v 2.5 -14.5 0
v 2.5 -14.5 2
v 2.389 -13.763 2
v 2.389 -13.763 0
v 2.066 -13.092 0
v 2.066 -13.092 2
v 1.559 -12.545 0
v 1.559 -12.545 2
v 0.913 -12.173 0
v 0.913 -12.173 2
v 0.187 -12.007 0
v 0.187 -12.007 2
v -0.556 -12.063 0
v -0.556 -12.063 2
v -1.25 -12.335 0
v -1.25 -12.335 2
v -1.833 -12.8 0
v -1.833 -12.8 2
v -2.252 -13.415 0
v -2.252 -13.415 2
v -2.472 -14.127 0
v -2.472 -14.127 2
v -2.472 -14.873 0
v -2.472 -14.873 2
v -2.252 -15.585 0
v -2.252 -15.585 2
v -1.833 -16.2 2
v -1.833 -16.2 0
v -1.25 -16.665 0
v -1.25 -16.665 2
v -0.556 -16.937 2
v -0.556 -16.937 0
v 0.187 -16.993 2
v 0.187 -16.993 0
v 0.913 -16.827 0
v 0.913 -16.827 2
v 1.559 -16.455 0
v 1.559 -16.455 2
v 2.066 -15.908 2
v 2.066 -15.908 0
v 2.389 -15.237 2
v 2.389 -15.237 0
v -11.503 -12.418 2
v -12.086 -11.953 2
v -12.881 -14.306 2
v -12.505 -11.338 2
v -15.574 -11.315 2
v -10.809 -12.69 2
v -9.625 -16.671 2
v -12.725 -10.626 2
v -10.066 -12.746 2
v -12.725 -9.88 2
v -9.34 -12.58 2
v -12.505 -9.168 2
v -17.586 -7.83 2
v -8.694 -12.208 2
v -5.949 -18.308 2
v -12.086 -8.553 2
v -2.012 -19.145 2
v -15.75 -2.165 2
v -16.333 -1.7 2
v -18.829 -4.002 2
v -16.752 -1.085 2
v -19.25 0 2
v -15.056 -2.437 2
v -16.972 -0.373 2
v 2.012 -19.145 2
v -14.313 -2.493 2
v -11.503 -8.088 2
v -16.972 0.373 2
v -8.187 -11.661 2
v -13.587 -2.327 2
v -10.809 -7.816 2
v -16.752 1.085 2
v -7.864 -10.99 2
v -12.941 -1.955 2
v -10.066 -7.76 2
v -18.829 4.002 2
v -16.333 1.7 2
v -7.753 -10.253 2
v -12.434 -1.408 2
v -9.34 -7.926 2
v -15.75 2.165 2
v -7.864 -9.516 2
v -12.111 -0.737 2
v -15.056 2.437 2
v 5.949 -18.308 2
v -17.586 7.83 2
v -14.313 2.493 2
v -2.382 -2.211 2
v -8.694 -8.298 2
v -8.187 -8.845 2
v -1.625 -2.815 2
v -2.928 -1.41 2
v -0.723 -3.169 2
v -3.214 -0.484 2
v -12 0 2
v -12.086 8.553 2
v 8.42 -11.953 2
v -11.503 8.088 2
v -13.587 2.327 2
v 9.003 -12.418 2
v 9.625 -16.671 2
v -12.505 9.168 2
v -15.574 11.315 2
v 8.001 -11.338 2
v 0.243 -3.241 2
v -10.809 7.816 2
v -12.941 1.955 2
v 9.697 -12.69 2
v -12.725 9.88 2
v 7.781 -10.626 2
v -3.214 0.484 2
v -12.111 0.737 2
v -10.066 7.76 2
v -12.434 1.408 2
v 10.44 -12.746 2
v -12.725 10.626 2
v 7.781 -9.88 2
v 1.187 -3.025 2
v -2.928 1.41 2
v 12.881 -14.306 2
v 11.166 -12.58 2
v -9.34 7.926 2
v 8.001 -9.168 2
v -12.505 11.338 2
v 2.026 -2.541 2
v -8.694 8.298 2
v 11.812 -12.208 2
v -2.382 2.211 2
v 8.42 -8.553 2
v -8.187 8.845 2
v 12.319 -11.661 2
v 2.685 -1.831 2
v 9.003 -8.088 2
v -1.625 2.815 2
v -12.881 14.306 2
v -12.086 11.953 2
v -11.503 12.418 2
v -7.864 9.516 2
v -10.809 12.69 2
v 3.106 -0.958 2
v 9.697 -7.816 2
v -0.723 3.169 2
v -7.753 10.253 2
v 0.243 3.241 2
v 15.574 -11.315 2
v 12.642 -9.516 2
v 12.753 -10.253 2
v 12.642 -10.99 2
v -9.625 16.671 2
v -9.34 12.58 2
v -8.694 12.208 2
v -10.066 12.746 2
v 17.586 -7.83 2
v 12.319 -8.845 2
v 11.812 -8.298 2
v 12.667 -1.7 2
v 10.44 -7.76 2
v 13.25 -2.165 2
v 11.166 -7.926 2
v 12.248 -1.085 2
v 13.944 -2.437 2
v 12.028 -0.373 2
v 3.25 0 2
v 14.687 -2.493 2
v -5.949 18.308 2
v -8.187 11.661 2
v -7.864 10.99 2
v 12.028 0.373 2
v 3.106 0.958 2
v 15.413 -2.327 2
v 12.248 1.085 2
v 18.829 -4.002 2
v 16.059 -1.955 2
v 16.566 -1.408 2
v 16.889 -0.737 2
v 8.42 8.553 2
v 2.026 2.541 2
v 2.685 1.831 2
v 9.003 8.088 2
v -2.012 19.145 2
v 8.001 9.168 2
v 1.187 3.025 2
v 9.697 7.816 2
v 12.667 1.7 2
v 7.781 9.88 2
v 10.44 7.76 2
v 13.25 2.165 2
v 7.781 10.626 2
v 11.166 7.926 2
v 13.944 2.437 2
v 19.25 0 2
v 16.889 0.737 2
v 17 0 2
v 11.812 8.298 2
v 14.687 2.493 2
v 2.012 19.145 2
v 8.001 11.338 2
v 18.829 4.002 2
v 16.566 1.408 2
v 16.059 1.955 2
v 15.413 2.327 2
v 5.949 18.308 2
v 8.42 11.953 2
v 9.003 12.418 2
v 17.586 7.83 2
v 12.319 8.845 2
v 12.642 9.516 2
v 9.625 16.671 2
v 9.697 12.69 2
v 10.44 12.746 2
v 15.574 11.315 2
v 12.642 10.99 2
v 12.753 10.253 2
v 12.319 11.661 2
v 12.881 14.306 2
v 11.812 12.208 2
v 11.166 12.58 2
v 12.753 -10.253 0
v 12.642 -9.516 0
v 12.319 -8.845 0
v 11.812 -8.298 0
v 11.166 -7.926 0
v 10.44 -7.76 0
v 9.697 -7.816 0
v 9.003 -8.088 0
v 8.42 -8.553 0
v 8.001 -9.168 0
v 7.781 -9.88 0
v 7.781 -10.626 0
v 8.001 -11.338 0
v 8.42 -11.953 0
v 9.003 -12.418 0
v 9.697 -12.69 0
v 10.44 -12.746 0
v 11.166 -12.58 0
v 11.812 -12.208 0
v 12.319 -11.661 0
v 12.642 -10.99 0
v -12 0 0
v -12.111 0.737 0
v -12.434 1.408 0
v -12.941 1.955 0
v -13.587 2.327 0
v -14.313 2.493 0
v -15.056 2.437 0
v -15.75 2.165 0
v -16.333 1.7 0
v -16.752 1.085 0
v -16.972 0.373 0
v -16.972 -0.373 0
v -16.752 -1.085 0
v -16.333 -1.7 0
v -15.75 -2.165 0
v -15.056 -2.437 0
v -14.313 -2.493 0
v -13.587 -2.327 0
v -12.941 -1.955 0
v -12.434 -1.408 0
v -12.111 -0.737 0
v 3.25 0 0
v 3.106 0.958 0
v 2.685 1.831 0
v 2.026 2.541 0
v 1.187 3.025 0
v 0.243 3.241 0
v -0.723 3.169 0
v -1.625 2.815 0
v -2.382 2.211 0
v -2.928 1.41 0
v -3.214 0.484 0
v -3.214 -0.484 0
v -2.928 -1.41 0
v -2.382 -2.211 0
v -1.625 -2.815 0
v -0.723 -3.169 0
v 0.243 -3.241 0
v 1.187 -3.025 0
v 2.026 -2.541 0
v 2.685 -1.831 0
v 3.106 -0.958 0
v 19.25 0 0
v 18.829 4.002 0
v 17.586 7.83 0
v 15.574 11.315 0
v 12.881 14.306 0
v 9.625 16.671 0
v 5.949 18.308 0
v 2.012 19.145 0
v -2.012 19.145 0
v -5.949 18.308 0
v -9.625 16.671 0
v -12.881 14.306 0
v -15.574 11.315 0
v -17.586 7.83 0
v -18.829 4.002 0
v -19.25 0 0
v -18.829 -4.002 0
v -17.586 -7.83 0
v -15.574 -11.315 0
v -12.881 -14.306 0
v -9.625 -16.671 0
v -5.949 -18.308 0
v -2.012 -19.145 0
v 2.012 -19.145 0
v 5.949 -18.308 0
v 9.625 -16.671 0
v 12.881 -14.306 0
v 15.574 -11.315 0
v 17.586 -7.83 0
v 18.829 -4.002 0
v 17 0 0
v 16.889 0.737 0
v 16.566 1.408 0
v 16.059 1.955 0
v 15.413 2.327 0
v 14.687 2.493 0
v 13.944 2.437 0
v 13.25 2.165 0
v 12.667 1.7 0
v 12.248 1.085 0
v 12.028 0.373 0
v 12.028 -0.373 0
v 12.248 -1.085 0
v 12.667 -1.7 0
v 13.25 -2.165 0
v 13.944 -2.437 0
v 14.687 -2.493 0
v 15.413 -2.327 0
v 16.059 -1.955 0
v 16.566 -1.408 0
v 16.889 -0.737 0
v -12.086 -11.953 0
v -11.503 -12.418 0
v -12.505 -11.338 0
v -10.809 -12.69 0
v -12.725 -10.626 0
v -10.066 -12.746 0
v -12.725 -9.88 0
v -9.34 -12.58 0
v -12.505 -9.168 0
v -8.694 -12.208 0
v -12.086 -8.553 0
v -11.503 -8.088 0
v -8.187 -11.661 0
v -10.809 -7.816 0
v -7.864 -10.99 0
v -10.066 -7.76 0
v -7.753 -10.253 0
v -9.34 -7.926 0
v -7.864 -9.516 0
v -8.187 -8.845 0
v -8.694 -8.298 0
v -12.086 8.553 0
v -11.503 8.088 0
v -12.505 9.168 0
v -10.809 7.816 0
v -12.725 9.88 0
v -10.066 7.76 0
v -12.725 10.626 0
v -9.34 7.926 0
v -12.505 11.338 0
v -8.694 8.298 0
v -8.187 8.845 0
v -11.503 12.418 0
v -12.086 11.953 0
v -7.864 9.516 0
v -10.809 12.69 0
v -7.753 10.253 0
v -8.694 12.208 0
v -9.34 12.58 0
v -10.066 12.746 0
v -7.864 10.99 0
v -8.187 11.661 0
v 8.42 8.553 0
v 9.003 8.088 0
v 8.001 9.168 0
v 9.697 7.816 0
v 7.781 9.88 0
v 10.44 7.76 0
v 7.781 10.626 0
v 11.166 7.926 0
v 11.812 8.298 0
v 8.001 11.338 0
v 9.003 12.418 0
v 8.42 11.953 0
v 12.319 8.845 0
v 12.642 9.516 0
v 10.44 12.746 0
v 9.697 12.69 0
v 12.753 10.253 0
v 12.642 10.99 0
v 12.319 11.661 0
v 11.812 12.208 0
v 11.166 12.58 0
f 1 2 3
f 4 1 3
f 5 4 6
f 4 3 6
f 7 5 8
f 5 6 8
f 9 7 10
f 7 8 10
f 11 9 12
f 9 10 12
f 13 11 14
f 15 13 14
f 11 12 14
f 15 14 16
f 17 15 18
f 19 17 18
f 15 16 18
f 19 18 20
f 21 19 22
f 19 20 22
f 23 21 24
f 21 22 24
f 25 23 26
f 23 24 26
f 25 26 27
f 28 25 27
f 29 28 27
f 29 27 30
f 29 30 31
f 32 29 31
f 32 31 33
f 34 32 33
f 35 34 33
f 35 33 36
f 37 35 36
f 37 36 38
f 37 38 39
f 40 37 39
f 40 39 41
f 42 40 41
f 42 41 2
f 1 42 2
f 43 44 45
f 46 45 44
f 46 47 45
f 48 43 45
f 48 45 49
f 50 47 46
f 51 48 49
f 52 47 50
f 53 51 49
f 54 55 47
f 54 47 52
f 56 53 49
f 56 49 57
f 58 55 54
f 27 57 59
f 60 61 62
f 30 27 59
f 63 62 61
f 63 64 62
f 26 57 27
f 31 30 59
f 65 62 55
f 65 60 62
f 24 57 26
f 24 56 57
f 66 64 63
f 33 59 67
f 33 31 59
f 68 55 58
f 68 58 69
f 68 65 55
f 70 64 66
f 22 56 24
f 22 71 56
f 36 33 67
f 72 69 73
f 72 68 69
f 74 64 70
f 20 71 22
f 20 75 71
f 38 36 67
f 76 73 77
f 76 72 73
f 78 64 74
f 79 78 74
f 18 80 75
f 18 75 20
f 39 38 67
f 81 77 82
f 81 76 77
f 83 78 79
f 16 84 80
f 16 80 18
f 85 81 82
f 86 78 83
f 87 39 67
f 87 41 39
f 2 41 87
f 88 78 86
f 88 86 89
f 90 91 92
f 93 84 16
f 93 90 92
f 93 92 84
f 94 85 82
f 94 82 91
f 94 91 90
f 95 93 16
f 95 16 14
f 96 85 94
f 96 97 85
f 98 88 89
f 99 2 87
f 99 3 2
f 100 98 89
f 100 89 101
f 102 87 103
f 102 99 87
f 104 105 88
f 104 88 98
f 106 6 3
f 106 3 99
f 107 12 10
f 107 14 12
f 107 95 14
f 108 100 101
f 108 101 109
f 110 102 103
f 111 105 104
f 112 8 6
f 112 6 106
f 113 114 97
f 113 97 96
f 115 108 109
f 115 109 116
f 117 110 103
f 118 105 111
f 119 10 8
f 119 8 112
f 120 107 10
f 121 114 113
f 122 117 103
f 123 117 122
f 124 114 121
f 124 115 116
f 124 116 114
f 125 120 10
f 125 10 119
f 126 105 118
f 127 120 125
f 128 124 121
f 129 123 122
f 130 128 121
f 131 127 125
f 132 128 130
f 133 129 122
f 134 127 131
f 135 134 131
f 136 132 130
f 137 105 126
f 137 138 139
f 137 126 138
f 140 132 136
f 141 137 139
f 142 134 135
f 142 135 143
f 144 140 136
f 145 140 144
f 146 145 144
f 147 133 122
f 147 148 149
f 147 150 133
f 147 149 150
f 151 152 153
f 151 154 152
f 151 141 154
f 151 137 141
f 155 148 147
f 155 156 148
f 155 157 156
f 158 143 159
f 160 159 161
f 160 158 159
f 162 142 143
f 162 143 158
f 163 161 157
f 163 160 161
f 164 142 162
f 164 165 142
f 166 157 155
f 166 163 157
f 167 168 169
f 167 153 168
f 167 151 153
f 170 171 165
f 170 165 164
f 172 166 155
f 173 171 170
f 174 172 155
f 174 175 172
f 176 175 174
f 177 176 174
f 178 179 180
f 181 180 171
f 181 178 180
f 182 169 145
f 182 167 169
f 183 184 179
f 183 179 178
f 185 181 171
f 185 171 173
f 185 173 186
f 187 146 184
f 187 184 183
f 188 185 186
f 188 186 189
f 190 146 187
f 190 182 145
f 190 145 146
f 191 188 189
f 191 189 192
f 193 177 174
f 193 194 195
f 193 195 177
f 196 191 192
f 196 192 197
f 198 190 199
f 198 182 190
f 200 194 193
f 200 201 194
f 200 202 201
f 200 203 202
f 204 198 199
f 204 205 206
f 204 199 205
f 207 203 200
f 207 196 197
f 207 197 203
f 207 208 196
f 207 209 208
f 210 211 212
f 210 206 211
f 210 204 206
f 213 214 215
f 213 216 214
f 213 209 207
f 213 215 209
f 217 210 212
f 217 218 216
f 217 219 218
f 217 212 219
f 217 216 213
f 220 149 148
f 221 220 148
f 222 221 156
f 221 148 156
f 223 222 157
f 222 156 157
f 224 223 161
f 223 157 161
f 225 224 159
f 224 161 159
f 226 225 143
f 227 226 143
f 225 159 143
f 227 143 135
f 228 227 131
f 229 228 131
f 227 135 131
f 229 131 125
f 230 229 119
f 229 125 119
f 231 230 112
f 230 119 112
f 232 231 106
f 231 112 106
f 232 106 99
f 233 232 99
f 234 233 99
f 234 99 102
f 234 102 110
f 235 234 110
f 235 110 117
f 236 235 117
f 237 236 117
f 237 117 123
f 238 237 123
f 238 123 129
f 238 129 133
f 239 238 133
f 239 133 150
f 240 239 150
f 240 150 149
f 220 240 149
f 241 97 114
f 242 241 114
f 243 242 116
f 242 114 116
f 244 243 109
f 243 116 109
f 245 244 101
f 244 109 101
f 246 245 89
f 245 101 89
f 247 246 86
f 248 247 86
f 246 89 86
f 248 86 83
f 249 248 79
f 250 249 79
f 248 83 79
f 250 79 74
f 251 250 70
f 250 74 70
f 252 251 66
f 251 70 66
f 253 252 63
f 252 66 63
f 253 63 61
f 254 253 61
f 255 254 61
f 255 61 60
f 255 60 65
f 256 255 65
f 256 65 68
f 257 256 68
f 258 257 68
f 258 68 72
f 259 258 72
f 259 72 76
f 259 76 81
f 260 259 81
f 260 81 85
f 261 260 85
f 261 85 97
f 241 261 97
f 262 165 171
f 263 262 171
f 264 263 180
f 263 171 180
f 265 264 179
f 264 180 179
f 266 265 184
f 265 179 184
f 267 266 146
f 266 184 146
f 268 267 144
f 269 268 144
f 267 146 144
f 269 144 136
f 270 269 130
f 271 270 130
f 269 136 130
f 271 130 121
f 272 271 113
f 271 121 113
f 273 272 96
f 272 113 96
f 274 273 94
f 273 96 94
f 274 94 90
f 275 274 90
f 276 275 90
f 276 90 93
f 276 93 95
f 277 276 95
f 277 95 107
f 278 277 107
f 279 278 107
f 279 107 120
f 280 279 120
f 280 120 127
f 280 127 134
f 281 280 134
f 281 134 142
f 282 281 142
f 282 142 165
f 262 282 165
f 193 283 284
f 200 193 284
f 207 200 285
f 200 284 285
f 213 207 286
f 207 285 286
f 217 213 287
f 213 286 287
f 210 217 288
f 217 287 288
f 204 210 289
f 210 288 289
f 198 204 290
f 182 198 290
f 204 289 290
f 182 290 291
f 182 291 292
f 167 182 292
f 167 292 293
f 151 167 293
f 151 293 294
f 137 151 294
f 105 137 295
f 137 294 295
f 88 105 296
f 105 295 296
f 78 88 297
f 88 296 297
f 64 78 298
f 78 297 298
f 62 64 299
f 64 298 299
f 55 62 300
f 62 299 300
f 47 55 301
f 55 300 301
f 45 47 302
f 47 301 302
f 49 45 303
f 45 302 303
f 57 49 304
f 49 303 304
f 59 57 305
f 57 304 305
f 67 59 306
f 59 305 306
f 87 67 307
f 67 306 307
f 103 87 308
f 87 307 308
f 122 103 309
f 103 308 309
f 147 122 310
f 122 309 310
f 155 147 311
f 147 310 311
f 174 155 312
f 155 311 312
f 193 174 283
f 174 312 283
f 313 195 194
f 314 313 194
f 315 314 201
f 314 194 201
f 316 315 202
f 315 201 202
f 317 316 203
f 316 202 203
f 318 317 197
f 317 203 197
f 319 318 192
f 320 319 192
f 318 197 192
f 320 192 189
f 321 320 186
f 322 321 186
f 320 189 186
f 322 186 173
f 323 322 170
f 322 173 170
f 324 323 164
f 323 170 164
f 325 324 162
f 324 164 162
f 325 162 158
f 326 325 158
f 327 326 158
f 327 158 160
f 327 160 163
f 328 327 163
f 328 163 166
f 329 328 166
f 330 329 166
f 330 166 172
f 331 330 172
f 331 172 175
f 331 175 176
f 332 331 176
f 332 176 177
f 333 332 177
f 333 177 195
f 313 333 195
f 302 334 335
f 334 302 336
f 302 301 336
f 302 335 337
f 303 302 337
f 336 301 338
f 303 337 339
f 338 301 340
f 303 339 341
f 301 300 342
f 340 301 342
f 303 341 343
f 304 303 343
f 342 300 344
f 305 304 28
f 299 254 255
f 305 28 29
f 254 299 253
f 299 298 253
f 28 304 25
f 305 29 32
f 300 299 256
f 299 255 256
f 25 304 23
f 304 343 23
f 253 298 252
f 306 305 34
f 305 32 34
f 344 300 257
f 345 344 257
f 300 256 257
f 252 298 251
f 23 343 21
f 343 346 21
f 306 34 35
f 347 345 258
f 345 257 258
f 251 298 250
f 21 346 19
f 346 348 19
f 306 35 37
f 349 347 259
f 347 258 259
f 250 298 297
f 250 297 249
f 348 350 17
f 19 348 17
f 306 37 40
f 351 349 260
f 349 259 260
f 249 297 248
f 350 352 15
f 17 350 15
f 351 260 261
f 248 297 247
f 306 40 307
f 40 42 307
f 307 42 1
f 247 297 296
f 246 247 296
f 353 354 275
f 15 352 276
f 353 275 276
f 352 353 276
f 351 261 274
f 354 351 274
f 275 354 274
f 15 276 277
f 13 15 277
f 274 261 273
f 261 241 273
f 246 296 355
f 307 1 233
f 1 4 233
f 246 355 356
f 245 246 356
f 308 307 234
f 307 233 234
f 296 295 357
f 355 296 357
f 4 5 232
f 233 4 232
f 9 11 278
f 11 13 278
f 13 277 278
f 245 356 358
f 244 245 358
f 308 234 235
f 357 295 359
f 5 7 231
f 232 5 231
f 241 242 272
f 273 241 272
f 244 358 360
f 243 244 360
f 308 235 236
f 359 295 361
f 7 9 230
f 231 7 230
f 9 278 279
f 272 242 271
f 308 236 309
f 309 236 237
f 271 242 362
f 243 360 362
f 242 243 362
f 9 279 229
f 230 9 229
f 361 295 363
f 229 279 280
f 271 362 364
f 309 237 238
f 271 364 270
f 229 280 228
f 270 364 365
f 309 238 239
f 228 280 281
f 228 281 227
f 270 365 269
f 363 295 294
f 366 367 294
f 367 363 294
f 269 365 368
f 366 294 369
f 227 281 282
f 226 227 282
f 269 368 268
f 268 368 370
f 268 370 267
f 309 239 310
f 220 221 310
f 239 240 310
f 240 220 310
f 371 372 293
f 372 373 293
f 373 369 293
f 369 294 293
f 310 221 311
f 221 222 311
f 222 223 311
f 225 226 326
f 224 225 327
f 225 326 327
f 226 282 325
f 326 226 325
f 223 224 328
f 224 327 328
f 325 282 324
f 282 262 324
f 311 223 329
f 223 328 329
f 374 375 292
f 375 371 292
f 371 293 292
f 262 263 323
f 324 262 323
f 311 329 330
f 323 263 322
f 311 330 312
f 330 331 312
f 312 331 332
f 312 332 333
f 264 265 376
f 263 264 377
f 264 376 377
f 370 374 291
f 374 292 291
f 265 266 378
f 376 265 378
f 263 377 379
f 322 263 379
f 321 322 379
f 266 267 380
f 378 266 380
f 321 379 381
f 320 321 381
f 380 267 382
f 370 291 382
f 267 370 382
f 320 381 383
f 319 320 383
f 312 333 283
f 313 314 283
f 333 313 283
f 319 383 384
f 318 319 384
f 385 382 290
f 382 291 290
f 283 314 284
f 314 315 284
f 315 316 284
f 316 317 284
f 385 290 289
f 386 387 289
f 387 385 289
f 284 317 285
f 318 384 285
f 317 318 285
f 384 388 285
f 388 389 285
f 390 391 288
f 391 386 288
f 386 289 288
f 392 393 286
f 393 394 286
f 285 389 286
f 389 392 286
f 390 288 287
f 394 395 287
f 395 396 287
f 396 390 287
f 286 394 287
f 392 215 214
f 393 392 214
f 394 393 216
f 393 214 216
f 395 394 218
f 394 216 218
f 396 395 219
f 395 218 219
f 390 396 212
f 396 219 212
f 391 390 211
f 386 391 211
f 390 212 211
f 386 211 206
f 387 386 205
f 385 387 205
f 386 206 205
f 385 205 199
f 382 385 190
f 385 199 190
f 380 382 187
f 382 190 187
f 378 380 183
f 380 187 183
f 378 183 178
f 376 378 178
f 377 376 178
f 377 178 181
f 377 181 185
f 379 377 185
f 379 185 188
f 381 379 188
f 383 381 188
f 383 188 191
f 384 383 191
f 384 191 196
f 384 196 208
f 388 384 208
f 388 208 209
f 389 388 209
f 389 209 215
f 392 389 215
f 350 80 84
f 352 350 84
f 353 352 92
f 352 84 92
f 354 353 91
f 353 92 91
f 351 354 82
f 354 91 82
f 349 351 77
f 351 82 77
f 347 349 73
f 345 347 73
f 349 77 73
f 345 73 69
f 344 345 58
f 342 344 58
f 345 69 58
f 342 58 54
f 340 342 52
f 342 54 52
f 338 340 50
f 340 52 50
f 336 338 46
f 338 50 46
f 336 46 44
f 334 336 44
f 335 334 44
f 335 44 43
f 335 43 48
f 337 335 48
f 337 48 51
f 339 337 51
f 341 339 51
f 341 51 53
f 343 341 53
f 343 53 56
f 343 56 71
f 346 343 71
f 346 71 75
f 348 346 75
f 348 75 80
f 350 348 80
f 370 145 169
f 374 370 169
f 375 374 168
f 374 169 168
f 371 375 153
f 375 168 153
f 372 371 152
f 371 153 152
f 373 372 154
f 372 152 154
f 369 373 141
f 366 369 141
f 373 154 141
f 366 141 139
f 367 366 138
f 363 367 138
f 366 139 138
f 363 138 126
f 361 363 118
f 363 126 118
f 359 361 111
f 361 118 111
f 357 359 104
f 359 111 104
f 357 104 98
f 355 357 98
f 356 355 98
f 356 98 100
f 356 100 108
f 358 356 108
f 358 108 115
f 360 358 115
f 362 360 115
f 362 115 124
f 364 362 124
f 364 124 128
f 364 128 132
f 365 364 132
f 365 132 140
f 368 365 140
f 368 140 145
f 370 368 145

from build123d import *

# Parameters (mm, degrees)
SKETCH_1_R          = 19.25
EXTRUDE_1_DEPTH     = 2
SKETCH_4_R          = 2.5
SKETCH_4_R_2        = 3.25
CUT_EXTRUDE_2_DEPTH = 3


with BuildPart() as part:
    # Эскиз1 → Вытянуть1 (new body)
    with BuildSketch(Plane.XY):
        Circle(SKETCH_1_R)
    extrude(amount=EXTRUDE_1_DEPTH)

    # Эскиз4 → Вытянуть2 (cut, through all)
    with BuildSketch(Plane.XY.offset(2)):
        with Locations((-10.253048327, 10.253048327)):
            Circle(SKETCH_4_R)
        with Locations((-14.5, 0)):
            Circle(SKETCH_4_R)
        with Locations((-10.253048327, -10.253048327)):
            Circle(SKETCH_4_R)
        with Locations((0, -14.5)):
            Circle(SKETCH_4_R)
        with Locations((10.253048327, -10.253048327)):
            Circle(SKETCH_4_R)
        with Locations((14.5, 0)):
            Circle(SKETCH_4_R)
        with Locations((10.253048327, 10.253048327)):
            Circle(SKETCH_4_R)
        Circle(SKETCH_4_R_2)
    extrude(amount=-CUT_EXTRUDE_2_DEPTH, mode=Mode.SUBTRACT)


solid = part.part
